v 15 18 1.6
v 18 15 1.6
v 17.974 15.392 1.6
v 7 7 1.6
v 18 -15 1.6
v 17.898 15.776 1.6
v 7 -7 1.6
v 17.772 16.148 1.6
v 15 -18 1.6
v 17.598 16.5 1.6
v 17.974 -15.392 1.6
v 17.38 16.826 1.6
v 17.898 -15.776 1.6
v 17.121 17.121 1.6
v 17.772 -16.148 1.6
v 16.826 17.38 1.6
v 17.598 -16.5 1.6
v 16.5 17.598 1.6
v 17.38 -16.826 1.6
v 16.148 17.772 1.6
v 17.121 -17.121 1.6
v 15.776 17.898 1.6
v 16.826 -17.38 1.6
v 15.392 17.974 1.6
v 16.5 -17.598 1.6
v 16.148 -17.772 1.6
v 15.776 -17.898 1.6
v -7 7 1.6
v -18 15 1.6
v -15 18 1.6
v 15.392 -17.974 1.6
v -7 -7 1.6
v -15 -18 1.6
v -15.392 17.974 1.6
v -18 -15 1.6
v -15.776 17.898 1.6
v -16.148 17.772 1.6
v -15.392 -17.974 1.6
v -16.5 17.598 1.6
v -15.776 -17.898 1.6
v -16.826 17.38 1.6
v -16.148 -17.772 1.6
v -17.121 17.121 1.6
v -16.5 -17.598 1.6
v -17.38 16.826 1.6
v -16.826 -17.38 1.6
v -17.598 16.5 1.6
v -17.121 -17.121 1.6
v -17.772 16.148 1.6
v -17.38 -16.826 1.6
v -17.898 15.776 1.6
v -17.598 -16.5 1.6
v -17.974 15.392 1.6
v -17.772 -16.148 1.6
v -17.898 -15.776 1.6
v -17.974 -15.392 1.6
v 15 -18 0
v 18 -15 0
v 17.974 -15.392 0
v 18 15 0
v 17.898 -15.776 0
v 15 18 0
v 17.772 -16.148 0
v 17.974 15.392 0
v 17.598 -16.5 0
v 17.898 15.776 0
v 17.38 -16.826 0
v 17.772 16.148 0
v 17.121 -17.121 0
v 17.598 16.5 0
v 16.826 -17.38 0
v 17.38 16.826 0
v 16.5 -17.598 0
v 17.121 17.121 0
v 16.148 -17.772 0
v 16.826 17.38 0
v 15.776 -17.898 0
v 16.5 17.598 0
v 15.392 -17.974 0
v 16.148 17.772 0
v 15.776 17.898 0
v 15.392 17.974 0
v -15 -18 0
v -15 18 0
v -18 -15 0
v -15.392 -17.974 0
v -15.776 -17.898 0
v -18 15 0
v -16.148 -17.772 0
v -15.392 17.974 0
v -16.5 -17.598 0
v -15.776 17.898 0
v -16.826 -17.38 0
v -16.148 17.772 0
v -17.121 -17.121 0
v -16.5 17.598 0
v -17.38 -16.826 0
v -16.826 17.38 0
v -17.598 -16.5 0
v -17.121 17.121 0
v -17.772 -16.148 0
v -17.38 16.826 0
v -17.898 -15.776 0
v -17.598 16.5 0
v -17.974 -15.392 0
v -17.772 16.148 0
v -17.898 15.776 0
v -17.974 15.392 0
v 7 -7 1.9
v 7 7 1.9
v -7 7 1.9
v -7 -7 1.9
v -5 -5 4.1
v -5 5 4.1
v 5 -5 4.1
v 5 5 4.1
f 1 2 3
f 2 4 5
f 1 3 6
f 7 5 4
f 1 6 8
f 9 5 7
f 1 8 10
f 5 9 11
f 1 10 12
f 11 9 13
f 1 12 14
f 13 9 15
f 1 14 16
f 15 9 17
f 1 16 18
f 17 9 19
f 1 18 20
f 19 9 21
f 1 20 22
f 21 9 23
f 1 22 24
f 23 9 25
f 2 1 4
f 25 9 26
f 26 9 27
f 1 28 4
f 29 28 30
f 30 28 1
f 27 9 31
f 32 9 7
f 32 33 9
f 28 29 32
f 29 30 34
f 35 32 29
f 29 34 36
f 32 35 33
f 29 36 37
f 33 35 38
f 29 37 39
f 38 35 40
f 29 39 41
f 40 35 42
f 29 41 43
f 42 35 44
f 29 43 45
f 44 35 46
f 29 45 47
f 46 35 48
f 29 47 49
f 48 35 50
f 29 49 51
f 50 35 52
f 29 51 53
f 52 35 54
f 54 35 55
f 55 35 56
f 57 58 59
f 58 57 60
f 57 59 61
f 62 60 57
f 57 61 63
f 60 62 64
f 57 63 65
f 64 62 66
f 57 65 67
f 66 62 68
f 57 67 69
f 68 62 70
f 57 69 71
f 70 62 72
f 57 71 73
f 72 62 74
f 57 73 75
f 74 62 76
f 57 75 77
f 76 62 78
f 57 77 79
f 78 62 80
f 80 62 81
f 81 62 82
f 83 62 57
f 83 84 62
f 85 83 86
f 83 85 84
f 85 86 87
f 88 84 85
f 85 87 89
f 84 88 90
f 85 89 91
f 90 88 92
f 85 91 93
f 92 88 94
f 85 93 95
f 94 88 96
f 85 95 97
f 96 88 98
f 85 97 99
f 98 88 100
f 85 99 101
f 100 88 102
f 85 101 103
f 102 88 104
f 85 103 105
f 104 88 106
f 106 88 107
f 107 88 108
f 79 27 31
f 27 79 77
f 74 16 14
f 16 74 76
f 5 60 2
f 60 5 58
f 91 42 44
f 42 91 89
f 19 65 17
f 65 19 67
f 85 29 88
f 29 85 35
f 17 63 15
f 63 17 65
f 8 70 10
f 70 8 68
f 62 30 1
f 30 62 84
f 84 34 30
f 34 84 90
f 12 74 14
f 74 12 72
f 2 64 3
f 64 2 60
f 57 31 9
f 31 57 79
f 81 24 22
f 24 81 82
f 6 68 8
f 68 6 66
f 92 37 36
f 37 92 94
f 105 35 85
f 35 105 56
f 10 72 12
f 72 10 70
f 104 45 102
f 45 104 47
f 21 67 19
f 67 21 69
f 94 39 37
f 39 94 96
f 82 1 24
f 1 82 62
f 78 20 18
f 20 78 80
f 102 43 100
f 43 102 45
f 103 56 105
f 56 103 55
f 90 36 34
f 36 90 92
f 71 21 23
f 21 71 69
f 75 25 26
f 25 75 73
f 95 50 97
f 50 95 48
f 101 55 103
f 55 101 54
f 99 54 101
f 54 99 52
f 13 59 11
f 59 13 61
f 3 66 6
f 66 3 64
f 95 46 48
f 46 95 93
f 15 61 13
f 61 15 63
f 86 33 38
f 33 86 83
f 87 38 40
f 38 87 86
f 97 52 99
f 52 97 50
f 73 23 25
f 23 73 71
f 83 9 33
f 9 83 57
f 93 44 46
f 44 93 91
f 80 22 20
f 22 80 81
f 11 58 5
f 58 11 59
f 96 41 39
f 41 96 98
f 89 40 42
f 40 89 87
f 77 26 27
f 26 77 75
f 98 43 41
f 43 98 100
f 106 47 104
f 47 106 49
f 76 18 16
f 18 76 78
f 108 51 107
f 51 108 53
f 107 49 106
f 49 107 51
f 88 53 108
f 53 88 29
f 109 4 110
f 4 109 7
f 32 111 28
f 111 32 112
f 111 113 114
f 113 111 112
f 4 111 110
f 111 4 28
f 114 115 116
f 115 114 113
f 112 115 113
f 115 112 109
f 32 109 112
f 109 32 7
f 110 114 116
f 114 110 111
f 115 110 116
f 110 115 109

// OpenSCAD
$fa = 2;
$fs = 0.4;

module flight_controller() {
  color("#0b3d0b")
    union() {
      hull() {
        for (x = [-15, 15], y = [-15, 15])
          translate([x, y, 0])
            cylinder(h = 1.6, d = 6);
      }
      // The MCU sits on the board (it floated 1.2 mm above it).
      color("#1a1a1a")
        translate([0, 0, 1.7])
          hull() {
            cube([14, 14, 0.4], center = true);
            translate([0, 0, 2.2])
              cube([10, 10, 0.4], center = true);
          }
      for (x = [-15.25, 15.25], y = [-15.25, 15.25])
        translate([x, y, 0])
          cylinder(h = 1.6, d = 5);
    }
}

flight_controller();
